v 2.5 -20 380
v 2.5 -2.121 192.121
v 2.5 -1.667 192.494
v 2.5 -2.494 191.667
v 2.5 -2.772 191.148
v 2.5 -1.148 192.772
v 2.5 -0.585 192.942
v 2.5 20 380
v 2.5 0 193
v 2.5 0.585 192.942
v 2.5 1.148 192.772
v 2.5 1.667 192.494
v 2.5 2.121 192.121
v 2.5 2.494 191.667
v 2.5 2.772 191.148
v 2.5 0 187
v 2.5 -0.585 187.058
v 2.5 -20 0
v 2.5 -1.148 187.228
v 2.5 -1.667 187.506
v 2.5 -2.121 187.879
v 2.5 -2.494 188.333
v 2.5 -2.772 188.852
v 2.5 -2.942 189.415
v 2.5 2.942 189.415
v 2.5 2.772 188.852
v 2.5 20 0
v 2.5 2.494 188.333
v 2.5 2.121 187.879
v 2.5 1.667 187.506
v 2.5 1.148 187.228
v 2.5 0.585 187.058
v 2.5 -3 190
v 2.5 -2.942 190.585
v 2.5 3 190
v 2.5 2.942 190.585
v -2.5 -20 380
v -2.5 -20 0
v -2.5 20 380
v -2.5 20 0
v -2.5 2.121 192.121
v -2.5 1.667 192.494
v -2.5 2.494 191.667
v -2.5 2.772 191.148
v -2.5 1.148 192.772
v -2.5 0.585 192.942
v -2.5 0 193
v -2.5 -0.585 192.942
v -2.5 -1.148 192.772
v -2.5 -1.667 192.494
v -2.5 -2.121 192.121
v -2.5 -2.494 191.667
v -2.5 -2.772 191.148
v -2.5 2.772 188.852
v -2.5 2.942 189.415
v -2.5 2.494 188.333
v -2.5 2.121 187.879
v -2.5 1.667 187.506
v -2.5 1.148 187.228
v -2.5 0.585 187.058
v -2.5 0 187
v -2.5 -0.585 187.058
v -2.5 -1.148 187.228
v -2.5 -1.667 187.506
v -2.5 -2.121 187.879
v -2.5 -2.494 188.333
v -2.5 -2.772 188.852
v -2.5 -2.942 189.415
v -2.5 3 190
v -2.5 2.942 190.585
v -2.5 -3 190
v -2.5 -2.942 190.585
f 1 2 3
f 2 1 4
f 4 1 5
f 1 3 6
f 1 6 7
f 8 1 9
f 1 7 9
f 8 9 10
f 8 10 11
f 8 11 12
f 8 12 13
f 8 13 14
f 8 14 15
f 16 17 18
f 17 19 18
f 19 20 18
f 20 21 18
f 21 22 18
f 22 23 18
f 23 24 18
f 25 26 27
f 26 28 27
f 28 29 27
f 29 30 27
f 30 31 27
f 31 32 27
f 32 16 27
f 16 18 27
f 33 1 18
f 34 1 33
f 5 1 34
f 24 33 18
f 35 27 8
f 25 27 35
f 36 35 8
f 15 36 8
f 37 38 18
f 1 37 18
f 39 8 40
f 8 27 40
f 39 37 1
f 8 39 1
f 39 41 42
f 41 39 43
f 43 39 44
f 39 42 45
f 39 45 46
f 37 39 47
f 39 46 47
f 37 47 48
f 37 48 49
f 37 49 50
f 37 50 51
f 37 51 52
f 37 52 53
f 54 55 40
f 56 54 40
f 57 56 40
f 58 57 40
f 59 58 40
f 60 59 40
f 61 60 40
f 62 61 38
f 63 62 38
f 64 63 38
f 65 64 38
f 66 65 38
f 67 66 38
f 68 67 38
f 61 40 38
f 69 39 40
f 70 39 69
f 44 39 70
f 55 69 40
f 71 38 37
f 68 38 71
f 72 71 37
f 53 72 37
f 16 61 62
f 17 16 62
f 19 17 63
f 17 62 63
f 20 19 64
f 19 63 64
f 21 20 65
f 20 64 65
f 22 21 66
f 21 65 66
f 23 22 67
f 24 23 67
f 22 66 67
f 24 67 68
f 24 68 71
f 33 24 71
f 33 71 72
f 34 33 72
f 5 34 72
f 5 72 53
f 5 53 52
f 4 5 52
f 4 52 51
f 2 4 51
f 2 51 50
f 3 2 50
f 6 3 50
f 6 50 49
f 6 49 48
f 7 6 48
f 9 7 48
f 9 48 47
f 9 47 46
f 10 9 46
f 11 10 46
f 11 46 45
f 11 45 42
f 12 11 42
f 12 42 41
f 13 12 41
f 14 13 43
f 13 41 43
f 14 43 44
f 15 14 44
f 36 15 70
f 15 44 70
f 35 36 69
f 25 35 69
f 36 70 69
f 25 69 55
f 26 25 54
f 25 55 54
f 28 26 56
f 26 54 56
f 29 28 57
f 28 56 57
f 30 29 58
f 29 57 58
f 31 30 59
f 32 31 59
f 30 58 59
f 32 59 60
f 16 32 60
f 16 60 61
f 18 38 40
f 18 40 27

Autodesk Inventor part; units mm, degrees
ref_plane "YZ Plane" through (0, 0, 0) normal (1, 0, 0) x (0, 1, 0)
ref_plane "XZ Plane" through (0, 0, 0) normal (0, 1, 0) x (-1, 0, 0)
ref_plane "XY Plane" through (0, 0, 0) normal (0, 0, 1) x (1, 0, 0)
sketch "Skizze1" plane through (0, 0, 0) normal (0, 0, 1) x (1, 0, 0)
  line L0 (-2.5, -20) -> (2.5, -20)
  line L1 (2.5, -20) -> (2.5, 20)
  line L2 (2.5, 20) -> (-2.5, 20)
  line L3 (-2.5, 20) -> (-2.5, -20)
  line L4 (-2.5, -20) -> (2.5, 20) construction
  line L5 (2.5, -20) -> (-2.5, 20) construction
  point P0 (0, 0)
  dimension "d0" = 5
  dimension "d1" = 40
extrude "Extrusion1" add sketch "Skizze1" along normal blind 380
sketch "Skizze2" plane through (2.5, -20, 0) normal (1, 0, 0) x (0, 0, -1)
  line L0 (0, 0) -> (0, 40) projected
  line L1 (0, 40) -> (-380, 40) projected
  line L2 (-380, 0) -> (-380, 40) projected
  line L3 (0, 0) -> (-380, 0) projected
  point P0 (0, 20)
  point P1 (-190, 20)
  point P2 (0, 20)
  dimension "d4" = 380
  dimension "d5" = 190
hole "Bohrung1" at (2.5, 0, 190) direction (-1, 0, 0) diameter 6 end through all
equation "\"d5\" = 0.5 * d4"
properties part number "Querstrebe_camera" material "Holz (Eiche)"
